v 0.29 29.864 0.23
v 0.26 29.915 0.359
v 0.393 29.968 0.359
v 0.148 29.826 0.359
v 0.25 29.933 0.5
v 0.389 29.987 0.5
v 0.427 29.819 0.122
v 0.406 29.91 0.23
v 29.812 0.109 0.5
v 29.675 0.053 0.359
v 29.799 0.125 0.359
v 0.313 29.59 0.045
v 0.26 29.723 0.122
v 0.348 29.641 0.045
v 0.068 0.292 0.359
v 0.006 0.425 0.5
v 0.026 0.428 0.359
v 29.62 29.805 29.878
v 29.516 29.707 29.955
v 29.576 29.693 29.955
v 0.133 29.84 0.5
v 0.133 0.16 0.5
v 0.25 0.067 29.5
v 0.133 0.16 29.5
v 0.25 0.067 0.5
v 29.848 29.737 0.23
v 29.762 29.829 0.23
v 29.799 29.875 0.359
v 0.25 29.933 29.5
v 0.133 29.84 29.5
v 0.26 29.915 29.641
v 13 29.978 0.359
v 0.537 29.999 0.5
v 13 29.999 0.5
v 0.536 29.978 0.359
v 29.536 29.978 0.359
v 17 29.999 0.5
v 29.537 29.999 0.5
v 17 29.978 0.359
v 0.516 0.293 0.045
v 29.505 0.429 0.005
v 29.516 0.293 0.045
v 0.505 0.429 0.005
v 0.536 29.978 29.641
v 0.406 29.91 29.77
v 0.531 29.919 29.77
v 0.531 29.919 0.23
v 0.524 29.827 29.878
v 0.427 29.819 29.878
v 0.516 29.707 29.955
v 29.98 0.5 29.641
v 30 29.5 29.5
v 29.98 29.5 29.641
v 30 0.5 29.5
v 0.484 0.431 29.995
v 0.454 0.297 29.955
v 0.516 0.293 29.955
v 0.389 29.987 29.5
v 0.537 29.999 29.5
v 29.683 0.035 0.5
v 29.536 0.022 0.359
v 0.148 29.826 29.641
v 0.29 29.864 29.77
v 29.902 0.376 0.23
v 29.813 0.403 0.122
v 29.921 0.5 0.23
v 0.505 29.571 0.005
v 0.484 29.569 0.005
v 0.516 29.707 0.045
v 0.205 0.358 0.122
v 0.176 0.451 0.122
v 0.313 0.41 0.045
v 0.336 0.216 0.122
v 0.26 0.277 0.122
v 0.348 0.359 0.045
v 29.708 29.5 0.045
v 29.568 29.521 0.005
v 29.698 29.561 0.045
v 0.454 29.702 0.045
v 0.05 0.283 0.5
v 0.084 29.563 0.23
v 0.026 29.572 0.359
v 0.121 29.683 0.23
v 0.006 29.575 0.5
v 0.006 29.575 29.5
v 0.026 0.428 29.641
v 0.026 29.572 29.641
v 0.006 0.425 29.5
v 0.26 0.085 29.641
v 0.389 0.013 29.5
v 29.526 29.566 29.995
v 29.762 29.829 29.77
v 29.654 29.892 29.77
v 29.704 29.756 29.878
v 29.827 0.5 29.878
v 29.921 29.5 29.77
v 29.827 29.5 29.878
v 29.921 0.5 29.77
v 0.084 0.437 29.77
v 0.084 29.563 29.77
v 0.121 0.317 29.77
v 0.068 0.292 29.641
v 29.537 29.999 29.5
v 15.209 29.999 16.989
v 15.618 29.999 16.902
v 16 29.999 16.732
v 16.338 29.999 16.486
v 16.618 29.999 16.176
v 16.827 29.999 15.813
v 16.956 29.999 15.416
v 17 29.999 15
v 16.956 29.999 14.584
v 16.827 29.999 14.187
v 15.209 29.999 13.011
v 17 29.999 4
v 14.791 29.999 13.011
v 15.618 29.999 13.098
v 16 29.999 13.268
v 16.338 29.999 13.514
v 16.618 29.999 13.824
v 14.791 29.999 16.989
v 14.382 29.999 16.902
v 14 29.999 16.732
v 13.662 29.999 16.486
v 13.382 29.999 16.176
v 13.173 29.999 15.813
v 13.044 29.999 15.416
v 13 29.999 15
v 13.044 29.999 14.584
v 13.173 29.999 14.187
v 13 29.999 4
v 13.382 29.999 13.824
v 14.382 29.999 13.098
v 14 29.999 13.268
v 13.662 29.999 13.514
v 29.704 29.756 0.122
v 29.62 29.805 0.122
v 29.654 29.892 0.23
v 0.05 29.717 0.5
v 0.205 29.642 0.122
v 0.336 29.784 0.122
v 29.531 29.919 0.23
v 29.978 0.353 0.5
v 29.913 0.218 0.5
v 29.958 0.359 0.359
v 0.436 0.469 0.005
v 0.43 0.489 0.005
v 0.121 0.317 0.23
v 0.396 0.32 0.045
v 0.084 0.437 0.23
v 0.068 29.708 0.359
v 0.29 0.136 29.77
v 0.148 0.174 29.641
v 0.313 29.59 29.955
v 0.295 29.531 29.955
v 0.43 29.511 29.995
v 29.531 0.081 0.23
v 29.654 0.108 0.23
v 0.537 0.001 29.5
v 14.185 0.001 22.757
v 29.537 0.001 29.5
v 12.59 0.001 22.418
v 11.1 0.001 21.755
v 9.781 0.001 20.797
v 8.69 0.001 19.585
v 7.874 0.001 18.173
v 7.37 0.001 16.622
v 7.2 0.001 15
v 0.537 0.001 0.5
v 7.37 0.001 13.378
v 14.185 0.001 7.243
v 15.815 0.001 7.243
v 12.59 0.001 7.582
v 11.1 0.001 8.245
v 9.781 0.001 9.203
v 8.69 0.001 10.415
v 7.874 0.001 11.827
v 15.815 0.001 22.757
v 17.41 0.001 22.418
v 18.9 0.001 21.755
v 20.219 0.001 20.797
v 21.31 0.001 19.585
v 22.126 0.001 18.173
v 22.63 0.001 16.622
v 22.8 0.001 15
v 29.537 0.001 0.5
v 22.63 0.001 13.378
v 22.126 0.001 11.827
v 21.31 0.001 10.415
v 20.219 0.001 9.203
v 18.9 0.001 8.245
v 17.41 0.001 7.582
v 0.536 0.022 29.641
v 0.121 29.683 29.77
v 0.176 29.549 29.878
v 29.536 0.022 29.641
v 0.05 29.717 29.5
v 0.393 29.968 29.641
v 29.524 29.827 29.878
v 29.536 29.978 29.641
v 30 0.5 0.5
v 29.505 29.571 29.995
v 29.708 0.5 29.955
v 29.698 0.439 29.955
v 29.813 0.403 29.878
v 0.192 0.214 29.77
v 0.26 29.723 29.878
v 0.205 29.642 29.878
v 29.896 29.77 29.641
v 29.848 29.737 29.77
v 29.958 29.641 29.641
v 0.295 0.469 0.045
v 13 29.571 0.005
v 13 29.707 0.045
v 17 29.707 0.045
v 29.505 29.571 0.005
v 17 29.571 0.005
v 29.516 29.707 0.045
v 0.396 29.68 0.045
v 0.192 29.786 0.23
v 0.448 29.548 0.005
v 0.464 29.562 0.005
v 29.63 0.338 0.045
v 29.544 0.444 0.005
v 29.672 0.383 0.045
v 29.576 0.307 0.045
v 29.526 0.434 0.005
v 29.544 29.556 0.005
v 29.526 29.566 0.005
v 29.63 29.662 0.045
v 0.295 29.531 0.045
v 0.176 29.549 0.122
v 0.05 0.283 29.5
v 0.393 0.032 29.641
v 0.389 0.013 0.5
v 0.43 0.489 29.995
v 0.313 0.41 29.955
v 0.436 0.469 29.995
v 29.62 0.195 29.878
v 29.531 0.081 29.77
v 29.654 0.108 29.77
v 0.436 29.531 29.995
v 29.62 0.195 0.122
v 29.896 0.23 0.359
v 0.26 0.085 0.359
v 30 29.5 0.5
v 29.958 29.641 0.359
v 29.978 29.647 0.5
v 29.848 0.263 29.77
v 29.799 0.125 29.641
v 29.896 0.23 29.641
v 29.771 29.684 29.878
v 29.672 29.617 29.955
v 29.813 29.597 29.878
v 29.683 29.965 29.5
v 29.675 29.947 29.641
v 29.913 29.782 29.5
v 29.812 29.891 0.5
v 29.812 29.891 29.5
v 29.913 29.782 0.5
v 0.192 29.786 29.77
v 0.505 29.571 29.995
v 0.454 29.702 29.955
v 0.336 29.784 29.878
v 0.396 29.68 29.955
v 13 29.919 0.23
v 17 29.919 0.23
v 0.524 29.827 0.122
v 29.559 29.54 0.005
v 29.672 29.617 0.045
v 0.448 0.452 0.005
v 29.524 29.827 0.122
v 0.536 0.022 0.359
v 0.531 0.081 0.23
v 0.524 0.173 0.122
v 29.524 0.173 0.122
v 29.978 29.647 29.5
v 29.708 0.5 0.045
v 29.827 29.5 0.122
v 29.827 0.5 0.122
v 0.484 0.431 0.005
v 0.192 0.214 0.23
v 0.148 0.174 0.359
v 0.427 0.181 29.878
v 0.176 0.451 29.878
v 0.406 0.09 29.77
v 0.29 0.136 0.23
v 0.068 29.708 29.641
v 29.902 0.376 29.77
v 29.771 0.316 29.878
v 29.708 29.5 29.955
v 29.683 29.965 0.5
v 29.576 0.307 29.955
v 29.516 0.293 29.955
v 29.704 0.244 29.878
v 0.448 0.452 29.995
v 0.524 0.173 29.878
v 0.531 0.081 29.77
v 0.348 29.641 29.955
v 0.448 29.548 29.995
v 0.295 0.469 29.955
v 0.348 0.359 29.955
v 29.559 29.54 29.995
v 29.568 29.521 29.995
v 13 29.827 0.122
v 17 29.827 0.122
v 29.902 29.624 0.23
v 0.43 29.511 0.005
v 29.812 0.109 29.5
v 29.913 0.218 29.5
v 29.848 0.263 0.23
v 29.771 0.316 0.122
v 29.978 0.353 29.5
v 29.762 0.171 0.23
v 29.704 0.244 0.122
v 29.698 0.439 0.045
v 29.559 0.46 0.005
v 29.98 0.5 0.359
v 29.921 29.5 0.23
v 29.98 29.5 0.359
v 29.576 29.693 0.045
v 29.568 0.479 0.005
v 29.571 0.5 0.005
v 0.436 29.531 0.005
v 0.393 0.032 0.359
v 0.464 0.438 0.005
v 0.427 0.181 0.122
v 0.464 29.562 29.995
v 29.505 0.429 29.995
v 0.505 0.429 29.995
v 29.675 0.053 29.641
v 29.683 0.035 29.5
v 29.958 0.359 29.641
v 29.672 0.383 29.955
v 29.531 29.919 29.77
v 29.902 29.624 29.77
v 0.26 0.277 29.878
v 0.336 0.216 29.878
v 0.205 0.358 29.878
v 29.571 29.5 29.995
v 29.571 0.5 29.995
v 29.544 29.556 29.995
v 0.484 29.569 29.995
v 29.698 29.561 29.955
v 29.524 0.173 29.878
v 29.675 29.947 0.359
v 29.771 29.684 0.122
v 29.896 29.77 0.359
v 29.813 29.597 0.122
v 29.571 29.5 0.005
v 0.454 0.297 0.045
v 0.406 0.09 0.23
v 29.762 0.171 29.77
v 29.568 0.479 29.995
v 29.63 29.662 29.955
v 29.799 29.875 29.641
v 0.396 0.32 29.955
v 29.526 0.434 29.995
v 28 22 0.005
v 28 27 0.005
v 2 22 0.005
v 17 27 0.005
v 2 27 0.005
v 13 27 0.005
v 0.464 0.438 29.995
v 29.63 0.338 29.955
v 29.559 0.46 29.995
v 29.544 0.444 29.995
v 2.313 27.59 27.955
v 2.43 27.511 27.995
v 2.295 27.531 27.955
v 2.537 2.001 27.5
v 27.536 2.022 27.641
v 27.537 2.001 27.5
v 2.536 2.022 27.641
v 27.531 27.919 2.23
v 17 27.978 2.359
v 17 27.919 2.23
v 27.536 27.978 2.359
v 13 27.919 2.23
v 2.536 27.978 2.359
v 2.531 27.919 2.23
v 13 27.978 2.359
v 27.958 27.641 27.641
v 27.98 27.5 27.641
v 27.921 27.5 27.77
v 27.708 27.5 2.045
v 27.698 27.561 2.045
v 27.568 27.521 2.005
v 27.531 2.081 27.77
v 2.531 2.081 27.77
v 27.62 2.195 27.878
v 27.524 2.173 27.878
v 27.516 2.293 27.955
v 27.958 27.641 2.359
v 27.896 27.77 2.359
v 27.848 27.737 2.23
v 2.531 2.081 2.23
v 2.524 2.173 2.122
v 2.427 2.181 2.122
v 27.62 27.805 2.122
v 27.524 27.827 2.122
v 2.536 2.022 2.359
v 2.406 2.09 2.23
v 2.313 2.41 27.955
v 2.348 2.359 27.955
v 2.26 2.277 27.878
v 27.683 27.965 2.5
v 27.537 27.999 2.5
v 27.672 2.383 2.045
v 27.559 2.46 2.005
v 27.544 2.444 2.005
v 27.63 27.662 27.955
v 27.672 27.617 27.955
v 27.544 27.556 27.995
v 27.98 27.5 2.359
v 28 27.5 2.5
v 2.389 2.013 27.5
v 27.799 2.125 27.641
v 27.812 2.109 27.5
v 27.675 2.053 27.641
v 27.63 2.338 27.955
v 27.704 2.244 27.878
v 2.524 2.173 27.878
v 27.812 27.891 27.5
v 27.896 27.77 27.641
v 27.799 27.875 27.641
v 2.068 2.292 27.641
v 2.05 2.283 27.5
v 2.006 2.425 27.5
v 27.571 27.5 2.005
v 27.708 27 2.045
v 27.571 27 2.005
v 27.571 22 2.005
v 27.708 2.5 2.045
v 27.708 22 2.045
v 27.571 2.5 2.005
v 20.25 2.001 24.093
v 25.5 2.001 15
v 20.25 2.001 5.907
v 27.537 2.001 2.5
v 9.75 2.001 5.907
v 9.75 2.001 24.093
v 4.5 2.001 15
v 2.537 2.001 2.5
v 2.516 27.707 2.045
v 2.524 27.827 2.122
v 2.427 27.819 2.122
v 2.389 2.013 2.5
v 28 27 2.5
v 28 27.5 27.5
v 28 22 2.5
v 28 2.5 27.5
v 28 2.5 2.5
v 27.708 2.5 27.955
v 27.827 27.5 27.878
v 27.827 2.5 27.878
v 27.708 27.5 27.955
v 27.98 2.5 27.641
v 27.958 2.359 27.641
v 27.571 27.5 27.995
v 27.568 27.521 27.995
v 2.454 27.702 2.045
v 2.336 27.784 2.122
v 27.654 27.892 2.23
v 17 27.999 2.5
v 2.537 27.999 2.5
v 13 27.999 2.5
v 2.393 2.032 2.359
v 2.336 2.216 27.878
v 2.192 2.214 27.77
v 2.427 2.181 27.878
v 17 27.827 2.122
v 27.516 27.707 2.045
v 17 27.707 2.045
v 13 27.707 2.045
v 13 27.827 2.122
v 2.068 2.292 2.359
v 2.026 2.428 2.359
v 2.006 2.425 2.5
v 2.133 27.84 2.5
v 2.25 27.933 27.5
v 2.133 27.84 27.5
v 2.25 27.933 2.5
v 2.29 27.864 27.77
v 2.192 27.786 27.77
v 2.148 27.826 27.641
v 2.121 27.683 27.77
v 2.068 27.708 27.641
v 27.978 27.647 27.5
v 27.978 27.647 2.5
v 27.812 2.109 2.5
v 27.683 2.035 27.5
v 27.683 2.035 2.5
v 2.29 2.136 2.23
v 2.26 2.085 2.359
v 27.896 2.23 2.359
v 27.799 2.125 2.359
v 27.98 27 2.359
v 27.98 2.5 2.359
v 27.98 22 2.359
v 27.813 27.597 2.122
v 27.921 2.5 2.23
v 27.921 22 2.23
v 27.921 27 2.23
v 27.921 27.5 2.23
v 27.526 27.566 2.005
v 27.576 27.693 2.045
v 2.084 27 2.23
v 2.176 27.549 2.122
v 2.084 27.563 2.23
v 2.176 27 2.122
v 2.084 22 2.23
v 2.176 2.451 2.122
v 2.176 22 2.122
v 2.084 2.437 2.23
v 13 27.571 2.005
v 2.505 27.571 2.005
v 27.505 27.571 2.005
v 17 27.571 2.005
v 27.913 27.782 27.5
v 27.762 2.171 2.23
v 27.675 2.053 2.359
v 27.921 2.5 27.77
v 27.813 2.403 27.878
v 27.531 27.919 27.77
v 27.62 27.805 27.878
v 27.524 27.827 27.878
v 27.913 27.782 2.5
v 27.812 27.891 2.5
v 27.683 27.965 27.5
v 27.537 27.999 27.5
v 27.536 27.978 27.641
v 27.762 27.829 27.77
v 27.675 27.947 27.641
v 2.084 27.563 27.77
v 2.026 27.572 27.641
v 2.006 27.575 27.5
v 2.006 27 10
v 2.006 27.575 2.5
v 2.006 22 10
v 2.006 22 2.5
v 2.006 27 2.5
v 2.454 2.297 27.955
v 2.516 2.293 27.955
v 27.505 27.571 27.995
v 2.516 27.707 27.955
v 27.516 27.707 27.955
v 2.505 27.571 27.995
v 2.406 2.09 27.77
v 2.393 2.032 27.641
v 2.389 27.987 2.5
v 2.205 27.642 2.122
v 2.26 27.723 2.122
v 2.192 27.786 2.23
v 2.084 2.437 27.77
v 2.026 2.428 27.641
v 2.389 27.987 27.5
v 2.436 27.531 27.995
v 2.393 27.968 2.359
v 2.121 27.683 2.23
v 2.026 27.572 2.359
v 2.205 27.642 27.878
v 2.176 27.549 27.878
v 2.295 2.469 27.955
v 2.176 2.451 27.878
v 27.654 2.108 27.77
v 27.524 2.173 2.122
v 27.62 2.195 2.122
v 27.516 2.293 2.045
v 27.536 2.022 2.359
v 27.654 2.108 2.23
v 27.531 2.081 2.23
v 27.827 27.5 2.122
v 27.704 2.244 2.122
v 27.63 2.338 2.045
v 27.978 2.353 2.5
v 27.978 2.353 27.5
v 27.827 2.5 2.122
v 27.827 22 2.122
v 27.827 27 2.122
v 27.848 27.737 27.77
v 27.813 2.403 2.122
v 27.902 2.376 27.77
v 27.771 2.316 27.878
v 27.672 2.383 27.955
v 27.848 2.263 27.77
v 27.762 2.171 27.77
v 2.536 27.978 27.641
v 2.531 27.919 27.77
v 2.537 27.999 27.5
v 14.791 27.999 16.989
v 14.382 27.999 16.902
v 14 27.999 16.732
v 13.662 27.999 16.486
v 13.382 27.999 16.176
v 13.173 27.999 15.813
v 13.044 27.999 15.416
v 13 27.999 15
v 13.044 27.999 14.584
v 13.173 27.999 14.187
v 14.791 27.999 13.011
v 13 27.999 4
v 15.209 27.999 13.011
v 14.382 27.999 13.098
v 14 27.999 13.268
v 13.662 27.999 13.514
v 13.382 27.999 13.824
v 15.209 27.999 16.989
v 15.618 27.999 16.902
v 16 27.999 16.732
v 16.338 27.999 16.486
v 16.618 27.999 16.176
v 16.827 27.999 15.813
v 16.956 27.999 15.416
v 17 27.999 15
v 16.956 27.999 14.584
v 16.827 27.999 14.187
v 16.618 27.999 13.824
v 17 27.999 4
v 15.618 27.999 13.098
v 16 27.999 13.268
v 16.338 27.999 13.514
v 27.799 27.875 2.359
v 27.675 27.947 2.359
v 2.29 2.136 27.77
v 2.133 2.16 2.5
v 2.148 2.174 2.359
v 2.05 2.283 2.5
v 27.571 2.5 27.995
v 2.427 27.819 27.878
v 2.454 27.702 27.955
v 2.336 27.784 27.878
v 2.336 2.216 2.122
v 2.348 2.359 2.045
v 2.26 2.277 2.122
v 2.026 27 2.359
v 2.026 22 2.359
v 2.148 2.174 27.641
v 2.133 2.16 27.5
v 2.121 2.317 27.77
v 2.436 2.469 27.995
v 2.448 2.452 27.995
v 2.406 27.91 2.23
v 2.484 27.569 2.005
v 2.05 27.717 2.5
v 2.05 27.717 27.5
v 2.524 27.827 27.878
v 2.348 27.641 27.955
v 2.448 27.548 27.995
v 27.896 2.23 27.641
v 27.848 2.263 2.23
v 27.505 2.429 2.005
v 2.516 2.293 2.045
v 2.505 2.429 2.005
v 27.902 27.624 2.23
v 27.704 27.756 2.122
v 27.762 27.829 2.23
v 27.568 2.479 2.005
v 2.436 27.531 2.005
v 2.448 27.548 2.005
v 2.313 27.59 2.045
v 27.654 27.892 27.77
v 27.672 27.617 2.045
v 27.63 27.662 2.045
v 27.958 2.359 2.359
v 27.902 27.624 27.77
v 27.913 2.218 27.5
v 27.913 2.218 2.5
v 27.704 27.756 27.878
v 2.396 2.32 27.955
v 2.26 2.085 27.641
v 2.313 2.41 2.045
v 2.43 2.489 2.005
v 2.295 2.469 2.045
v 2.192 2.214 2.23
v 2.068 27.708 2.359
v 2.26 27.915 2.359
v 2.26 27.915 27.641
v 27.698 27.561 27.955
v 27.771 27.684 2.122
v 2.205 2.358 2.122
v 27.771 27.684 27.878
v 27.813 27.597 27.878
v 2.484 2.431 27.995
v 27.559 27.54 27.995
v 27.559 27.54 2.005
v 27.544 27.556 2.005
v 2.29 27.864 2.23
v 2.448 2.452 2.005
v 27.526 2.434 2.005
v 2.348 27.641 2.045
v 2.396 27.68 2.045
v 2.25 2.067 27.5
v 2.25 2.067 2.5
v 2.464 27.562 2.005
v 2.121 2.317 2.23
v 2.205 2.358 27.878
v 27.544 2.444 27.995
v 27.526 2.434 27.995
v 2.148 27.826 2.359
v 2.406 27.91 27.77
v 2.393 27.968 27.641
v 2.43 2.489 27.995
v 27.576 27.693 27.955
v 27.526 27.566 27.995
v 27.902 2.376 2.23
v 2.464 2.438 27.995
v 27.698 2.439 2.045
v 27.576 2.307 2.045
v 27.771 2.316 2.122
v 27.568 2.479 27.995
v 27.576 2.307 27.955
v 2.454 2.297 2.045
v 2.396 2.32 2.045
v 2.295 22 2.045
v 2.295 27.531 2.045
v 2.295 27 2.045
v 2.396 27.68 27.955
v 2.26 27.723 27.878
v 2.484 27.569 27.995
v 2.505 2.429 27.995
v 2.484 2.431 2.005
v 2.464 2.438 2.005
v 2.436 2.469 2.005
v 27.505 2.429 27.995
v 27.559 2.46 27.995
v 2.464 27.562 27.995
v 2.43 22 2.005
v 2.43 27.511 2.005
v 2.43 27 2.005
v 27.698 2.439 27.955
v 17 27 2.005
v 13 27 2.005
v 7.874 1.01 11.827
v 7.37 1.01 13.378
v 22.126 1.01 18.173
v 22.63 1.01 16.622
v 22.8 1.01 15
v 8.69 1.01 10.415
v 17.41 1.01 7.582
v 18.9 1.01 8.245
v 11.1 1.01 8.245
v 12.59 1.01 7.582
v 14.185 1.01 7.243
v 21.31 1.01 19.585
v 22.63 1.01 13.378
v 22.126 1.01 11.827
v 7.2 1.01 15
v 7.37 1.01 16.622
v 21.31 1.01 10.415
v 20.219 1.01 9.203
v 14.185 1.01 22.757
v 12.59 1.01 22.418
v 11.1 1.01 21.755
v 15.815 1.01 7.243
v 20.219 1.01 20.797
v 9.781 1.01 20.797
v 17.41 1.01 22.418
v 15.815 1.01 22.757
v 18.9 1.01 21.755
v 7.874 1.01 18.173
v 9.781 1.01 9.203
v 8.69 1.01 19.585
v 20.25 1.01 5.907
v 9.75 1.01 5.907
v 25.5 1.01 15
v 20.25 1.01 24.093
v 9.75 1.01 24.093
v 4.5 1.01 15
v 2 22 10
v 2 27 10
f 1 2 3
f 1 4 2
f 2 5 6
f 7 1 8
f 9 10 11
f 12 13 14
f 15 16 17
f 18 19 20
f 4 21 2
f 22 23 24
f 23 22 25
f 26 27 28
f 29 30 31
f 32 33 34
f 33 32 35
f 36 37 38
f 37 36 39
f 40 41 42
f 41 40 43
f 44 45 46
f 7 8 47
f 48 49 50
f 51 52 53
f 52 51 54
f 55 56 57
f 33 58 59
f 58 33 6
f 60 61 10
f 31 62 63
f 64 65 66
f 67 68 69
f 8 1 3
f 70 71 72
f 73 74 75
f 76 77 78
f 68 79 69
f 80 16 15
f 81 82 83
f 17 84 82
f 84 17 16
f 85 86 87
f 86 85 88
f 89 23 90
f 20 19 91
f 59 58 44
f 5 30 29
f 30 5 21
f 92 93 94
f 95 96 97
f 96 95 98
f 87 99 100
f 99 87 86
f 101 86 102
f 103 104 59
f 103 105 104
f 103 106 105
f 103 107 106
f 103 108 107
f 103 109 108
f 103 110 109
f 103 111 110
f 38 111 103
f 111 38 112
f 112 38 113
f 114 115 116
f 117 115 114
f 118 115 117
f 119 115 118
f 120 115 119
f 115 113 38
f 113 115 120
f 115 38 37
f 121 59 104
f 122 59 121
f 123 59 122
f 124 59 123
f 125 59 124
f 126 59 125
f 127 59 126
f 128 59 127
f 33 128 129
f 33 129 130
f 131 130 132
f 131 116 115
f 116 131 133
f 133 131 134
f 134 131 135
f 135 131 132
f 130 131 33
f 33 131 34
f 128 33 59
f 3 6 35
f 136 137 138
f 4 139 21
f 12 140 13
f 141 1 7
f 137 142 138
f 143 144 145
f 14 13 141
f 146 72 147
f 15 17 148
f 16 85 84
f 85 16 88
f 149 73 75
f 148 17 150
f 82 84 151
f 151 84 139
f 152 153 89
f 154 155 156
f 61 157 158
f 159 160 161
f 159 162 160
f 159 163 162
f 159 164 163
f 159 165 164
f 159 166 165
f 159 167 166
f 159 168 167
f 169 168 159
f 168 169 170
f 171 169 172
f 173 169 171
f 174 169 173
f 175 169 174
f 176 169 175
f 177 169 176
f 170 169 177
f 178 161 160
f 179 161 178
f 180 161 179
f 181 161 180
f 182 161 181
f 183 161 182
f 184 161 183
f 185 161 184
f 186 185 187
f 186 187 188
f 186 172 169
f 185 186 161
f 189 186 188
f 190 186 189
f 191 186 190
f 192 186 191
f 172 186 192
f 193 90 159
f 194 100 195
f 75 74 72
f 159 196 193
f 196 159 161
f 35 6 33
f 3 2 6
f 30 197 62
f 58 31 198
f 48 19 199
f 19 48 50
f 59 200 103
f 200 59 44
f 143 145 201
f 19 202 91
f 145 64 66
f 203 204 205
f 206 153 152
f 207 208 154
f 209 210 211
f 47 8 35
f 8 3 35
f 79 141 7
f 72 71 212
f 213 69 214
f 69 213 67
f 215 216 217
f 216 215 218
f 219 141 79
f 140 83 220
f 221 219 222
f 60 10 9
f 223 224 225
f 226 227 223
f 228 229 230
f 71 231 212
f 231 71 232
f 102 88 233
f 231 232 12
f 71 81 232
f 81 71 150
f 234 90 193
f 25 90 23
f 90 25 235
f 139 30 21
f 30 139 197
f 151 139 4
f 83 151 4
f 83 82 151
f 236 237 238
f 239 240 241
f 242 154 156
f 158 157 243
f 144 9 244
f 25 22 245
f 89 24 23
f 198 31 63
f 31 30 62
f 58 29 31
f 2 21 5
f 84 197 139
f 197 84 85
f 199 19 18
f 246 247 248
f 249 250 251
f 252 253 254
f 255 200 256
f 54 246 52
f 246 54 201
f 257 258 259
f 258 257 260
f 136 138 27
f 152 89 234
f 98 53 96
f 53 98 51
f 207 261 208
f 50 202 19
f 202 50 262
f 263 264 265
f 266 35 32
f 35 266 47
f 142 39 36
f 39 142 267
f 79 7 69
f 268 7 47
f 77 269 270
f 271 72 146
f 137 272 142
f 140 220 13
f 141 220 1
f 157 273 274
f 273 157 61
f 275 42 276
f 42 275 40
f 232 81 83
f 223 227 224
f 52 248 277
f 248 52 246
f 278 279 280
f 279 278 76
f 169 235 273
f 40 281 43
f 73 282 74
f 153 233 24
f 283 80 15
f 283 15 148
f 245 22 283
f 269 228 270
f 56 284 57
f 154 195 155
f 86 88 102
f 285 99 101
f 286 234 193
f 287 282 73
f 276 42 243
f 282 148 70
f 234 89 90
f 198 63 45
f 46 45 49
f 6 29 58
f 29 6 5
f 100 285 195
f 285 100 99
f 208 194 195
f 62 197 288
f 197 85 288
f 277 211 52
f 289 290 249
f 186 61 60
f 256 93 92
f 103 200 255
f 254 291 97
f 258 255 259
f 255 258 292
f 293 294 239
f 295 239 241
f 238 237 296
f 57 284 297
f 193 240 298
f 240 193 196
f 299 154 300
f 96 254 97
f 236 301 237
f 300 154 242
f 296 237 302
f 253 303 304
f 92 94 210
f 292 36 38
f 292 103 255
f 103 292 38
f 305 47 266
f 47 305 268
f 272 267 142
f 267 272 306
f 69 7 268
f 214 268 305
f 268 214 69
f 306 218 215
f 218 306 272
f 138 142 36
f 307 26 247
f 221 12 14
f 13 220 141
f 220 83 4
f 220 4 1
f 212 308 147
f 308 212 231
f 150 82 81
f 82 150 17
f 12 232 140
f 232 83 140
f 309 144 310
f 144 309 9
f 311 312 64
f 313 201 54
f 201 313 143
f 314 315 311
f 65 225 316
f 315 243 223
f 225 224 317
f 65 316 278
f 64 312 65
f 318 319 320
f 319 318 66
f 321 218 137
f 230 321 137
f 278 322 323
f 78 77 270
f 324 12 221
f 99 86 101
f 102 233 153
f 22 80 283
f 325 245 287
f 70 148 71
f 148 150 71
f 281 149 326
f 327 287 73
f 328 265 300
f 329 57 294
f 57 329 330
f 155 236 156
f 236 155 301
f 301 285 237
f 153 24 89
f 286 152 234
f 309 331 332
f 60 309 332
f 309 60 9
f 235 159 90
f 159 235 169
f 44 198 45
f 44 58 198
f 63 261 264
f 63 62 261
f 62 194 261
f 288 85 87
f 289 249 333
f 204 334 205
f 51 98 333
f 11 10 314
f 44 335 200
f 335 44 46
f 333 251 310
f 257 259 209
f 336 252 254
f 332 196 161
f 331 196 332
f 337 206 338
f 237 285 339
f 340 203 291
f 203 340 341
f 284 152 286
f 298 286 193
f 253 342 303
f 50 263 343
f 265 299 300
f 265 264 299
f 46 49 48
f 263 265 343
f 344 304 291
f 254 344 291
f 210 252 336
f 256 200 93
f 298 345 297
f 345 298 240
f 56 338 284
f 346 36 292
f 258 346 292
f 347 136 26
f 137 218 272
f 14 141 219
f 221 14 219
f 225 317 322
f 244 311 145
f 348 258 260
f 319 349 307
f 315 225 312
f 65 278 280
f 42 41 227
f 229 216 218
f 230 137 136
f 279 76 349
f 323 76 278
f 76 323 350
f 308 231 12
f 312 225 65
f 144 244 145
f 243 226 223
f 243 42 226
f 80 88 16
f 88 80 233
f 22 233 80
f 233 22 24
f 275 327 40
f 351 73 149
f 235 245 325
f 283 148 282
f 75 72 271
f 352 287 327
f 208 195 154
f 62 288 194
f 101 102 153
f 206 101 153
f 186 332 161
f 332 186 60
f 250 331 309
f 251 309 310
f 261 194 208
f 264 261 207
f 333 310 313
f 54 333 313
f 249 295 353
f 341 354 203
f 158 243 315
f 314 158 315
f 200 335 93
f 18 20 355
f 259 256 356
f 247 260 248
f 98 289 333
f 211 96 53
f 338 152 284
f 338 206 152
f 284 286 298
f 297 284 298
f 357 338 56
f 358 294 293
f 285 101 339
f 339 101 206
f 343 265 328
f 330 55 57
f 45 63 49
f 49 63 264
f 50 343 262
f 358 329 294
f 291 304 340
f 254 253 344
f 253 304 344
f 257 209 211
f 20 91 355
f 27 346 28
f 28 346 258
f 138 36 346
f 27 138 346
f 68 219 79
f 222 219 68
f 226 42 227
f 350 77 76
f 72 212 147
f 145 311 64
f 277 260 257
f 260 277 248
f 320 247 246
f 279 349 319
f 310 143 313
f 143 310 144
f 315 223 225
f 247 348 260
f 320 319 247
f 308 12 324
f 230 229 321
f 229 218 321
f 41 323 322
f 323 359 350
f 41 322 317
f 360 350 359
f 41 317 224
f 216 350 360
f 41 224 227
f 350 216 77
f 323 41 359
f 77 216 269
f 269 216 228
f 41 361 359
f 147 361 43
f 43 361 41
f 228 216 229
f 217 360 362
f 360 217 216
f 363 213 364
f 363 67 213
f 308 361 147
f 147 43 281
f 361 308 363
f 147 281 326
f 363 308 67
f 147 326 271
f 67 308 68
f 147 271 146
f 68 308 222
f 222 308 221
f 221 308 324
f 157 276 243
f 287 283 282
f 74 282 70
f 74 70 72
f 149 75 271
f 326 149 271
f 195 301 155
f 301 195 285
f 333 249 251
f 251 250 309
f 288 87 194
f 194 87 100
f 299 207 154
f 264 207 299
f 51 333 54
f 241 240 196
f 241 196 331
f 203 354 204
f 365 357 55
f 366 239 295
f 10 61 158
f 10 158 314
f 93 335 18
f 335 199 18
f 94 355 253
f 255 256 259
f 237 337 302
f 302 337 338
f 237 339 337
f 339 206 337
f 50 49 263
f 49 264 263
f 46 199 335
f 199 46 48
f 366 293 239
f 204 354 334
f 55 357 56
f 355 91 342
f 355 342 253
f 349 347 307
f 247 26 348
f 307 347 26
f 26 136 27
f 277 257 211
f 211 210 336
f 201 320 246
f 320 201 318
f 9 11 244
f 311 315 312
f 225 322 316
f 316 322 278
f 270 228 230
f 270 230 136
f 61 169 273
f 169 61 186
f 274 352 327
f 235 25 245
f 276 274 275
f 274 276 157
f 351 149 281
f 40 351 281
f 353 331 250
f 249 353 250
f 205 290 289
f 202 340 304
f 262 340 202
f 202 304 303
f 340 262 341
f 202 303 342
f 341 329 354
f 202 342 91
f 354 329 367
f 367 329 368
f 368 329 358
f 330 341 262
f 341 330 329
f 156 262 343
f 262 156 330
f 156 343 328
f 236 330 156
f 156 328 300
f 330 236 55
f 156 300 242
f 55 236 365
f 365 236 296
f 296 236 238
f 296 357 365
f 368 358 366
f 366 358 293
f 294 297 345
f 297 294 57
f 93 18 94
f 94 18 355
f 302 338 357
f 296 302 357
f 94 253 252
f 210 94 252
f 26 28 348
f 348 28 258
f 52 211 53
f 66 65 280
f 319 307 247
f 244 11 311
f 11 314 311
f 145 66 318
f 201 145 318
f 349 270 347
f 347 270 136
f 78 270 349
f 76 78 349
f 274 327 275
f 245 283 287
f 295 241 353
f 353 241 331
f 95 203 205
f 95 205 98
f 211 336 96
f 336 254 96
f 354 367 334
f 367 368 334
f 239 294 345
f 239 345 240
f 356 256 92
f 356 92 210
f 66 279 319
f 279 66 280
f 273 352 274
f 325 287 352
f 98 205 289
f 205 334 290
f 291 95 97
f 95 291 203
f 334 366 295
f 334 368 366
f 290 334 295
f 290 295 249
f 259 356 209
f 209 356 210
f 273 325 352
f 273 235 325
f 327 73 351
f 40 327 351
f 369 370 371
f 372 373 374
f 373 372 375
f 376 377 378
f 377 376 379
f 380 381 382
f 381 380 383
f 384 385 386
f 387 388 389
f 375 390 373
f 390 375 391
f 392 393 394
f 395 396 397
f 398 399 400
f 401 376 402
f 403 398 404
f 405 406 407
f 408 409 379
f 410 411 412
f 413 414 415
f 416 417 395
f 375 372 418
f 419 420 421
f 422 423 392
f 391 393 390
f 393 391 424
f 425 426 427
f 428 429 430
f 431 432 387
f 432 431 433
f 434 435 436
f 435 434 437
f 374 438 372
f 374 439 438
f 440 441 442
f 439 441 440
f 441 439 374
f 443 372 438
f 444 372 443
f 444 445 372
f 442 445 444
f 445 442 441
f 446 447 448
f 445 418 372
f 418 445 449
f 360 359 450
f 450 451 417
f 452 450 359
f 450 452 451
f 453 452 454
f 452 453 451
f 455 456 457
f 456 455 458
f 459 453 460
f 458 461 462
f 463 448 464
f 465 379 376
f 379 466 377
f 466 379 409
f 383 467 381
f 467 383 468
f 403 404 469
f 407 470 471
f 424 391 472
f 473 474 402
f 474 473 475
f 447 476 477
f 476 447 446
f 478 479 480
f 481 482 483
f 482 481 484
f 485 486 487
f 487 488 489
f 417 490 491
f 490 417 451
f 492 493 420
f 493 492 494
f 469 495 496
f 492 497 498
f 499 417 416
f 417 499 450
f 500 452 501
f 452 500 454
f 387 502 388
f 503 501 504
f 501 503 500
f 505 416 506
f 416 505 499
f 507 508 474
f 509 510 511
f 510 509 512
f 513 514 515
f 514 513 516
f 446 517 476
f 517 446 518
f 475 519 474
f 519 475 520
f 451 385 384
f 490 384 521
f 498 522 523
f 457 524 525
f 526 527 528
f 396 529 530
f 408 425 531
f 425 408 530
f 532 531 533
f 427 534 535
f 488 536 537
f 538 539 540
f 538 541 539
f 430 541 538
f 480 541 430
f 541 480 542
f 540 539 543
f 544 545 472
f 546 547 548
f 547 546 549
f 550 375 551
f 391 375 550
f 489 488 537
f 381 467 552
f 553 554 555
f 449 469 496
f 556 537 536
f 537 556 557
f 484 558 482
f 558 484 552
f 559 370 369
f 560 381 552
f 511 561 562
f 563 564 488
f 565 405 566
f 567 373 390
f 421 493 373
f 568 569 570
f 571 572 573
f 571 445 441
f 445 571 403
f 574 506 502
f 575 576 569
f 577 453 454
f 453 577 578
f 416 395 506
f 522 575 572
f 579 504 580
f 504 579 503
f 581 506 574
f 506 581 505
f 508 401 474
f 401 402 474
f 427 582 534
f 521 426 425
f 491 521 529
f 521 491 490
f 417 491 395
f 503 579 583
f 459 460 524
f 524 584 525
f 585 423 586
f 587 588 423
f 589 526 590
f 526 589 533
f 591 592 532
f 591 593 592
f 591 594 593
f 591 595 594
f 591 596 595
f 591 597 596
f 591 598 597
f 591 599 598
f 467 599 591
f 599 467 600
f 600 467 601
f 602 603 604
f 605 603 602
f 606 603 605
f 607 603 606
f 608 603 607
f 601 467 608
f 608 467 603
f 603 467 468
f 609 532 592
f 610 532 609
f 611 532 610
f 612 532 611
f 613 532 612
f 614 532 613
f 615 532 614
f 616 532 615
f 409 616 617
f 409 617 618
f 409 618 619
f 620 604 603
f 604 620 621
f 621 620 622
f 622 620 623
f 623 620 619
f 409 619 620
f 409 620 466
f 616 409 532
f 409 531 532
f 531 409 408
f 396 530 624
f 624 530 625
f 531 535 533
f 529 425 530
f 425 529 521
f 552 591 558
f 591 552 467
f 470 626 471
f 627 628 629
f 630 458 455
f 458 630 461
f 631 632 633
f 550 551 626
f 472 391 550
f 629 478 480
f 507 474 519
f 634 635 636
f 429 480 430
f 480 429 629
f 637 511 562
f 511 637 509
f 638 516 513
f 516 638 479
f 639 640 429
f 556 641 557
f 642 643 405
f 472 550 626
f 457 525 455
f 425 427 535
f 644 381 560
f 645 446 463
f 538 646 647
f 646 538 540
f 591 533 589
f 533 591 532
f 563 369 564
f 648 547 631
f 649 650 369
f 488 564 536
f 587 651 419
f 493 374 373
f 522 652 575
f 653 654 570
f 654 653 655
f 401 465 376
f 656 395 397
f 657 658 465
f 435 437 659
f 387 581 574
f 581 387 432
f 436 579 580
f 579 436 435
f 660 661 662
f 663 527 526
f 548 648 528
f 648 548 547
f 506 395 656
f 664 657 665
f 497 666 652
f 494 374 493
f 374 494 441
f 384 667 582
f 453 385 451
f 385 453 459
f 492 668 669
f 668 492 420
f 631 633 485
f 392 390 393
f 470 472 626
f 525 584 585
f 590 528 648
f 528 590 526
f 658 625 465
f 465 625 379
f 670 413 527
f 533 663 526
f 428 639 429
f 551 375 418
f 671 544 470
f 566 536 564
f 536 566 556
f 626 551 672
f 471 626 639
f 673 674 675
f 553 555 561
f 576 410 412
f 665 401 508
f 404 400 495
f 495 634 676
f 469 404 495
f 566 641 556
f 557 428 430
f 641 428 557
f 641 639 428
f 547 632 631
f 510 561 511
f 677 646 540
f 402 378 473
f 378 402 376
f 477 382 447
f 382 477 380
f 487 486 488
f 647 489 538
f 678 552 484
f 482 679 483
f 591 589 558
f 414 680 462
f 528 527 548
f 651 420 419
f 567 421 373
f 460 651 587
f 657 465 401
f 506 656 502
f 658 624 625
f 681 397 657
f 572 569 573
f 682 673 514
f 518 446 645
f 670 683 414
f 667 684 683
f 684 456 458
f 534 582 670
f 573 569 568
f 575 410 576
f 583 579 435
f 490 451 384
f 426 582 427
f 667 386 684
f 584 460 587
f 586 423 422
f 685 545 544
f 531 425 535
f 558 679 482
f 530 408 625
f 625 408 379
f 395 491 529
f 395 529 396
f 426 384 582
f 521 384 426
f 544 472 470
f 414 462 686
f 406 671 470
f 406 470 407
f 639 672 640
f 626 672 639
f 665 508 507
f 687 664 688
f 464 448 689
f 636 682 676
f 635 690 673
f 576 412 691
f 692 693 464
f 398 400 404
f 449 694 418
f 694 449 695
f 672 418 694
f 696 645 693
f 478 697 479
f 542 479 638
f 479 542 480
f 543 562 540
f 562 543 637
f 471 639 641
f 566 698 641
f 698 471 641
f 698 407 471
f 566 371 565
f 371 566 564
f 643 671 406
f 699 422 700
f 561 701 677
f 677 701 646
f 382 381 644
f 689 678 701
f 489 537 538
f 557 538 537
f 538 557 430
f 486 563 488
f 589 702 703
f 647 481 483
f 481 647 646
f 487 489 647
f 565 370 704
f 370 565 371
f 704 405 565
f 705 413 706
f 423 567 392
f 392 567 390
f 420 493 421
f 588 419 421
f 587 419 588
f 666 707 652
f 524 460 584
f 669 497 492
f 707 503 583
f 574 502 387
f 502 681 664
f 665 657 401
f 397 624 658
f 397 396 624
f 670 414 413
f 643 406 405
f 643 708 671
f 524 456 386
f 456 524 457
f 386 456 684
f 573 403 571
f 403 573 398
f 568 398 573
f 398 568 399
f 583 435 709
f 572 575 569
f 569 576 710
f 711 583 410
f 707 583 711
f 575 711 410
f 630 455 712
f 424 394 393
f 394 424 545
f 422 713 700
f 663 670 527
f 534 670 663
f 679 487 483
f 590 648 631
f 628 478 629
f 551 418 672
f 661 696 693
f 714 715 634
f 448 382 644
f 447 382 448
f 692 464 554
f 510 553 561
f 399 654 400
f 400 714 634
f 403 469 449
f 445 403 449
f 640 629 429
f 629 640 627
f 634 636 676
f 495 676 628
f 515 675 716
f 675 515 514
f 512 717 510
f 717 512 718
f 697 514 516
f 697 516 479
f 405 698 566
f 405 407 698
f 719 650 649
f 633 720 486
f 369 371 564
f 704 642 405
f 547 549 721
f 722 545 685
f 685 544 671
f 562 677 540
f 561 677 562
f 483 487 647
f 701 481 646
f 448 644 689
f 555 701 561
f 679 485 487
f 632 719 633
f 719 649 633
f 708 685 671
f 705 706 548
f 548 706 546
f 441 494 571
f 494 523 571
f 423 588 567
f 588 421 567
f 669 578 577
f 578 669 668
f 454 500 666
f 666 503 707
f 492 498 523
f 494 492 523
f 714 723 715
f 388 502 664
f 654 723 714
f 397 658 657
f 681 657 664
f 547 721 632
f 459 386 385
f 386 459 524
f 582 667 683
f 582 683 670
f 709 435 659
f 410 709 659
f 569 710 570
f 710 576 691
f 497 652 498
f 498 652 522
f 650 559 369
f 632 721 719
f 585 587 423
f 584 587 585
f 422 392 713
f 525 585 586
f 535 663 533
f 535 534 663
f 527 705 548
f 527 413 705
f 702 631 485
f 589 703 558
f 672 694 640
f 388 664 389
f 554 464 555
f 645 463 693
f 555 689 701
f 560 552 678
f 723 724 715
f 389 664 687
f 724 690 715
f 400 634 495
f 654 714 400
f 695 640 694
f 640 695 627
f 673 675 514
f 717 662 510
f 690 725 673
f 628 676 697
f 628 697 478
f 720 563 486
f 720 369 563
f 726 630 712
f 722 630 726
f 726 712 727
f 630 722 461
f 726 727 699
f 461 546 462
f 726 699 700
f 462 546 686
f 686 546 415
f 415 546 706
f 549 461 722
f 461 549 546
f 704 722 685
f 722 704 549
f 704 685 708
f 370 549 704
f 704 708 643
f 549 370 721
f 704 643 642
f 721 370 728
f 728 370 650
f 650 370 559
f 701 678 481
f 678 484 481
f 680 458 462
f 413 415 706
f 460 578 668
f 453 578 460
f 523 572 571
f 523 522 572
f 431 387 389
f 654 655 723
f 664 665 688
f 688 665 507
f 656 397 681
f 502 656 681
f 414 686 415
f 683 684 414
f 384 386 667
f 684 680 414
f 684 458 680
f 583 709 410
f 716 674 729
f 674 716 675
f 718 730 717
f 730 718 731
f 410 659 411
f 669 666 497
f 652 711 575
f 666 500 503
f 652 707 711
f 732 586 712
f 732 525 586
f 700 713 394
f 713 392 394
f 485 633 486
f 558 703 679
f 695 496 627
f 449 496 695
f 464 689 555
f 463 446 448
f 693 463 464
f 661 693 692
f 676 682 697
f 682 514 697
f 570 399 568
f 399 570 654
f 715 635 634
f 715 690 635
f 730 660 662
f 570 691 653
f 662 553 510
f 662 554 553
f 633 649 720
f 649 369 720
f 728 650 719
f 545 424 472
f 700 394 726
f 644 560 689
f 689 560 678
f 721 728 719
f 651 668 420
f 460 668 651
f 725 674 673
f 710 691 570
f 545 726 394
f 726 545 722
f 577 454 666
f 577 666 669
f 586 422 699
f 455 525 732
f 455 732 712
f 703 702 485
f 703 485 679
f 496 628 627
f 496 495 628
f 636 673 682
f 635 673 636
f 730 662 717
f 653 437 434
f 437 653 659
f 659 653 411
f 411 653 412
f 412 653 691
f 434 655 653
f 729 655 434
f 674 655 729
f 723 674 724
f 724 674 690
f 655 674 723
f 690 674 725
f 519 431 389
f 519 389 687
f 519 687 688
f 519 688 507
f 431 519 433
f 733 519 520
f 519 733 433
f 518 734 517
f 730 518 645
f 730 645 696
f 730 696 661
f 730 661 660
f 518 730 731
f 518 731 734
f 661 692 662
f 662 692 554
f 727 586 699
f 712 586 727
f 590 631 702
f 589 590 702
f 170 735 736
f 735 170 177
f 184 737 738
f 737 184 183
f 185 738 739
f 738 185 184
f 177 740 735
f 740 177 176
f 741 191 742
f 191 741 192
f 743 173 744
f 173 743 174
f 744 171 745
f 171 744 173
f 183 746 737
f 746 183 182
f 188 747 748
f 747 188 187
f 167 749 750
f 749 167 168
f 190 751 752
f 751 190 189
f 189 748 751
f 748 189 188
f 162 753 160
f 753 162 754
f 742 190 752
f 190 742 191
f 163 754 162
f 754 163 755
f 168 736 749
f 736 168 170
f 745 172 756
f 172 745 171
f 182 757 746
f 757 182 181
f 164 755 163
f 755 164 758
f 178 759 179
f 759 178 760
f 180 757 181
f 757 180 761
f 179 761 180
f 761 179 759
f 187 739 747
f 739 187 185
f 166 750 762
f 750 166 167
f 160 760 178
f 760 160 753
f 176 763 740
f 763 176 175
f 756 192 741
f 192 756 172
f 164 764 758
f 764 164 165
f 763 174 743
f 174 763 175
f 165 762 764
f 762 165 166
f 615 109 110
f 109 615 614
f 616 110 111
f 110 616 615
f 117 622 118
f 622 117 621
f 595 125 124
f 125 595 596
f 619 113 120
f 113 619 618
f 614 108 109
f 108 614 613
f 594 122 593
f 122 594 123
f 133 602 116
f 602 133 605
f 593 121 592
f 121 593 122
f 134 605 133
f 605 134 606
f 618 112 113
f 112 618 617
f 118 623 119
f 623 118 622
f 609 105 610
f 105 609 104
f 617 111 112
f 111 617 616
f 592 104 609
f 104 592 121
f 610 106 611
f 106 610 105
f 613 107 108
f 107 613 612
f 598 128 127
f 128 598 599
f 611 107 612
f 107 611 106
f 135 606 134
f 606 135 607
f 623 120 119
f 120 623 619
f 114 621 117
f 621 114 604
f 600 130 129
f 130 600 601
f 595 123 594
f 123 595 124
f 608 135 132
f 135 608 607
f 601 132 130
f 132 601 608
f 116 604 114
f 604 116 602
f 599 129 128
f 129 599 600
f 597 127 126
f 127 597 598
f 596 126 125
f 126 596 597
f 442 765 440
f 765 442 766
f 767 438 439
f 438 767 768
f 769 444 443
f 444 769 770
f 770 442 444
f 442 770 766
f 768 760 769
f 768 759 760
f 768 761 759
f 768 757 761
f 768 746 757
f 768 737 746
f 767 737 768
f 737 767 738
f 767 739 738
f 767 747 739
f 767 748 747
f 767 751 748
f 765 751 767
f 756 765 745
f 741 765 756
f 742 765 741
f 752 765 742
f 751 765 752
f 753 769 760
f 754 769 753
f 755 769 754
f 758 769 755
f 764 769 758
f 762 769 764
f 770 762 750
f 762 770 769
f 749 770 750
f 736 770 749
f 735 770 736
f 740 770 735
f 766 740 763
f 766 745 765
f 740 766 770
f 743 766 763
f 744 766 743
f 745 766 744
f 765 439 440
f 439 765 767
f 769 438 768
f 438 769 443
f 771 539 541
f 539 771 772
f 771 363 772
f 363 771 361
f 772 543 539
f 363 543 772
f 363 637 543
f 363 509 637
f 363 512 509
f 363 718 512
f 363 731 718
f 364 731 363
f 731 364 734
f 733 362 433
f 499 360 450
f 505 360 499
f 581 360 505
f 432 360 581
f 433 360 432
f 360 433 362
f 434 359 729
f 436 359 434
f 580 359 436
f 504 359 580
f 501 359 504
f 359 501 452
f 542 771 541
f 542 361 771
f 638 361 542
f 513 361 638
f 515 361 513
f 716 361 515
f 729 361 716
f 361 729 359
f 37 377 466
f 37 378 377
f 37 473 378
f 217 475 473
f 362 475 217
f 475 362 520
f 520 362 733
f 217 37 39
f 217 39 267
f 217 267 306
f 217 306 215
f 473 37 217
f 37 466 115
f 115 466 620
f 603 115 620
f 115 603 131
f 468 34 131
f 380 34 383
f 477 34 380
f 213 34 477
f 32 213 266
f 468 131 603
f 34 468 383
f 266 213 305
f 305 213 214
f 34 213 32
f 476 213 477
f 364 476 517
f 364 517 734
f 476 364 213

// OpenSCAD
// file: support/roundedcube.scad
// More information: https://danielupshaw.com/openscad-rounded-corners/
// License 2020-08-13: The only two people in this world who are allowed to use roundedcube.scad are named Dan Upshaw and Dan Fandrich

// Set to 0.01 for higher definition curves (renders slower)
$fs = 0.15;

module roundedcube(size = [1, 1, 1], center = false, radius = 0.5, apply_to = "all") {
	// If single value, convert to [x, y, z] vector
	size = (size[0] == undef) ? [size, size, size] : size;

	translate_min = radius;
	translate_xmax = size[0] - radius;
	translate_ymax = size[1] - radius;
	translate_zmax = size[2] - radius;

	diameter = radius * 2;

	obj_translate = (center == false) ?
		[0, 0, 0] : [
			-(size[0] / 2),
			-(size[1] / 2),
			-(size[2] / 2)
		];

	translate(v = obj_translate) {
		hull() {
			for (translate_x = [translate_min, translate_xmax]) {
				x_at = (translate_x == translate_min) ? "min" : "max";
				for (translate_y = [translate_min, translate_ymax]) {
					y_at = (translate_y == translate_min) ? "min" : "max";
					for (translate_z = [translate_min, translate_zmax]) {
						z_at = (translate_z == translate_min) ? "min" : "max";

						translate(v = [translate_x, translate_y, translate_z])
						if (
							(apply_to == "all") ||
							(apply_to == "xmin" && x_at == "min") || (apply_to == "xmax" && x_at == "max") ||
							(apply_to == "ymin" && y_at == "min") || (apply_to == "ymax" && y_at == "max") ||
							(apply_to == "zmin" && z_at == "min") || (apply_to == "zmax" && z_at == "max")
						) {
							sphere(r = radius);
						} else {
							rotate =
								(apply_to == "xmin" || apply_to == "xmax" || apply_to == "x") ? [0, 90, 0] : (
								(apply_to == "ymin" || apply_to == "ymax" || apply_to == "y") ? [90, 90, 0] :
								[0, 0, 0]
							);
							rotate(a = rotate)
							cylinder(h = diameter, r = radius, center = true);
						}
					}
				}
			}
		}
	}
}
// main file
btn_slot = 15.6;
d = 30;
wall = 2;
wall2 = wall*2;
dw = d + wall;

include <support/roundedcube.scad>

difference() {
  roundedcube([d, d, d]);

  translate([wall, wall, wall])
  roundedcube([d - wall2, d - wall2, d - wall2]);

  translate([d/2, 0, d/2])
  rotate([90, 0, 0])
  cylinder(r=btn_slot/2, h=10, center=true);

  translate([d/2, dw, d/2])
  rotate([90, 0, 0])
  cylinder(r=2, h=10, center=true);

  translate([d/2, wall+0.01, d/2])
  rotate([90, 0, 0])
  cylinder(r=21/2, h=wall/2, $fn=6);

  translate([wall, d-wall*4, 0])
  cube([d-wall2, 5, 10]);

  translate([d/2 - 2, d-wall*4, 0])
  cube([4, 10, 4]);
}
